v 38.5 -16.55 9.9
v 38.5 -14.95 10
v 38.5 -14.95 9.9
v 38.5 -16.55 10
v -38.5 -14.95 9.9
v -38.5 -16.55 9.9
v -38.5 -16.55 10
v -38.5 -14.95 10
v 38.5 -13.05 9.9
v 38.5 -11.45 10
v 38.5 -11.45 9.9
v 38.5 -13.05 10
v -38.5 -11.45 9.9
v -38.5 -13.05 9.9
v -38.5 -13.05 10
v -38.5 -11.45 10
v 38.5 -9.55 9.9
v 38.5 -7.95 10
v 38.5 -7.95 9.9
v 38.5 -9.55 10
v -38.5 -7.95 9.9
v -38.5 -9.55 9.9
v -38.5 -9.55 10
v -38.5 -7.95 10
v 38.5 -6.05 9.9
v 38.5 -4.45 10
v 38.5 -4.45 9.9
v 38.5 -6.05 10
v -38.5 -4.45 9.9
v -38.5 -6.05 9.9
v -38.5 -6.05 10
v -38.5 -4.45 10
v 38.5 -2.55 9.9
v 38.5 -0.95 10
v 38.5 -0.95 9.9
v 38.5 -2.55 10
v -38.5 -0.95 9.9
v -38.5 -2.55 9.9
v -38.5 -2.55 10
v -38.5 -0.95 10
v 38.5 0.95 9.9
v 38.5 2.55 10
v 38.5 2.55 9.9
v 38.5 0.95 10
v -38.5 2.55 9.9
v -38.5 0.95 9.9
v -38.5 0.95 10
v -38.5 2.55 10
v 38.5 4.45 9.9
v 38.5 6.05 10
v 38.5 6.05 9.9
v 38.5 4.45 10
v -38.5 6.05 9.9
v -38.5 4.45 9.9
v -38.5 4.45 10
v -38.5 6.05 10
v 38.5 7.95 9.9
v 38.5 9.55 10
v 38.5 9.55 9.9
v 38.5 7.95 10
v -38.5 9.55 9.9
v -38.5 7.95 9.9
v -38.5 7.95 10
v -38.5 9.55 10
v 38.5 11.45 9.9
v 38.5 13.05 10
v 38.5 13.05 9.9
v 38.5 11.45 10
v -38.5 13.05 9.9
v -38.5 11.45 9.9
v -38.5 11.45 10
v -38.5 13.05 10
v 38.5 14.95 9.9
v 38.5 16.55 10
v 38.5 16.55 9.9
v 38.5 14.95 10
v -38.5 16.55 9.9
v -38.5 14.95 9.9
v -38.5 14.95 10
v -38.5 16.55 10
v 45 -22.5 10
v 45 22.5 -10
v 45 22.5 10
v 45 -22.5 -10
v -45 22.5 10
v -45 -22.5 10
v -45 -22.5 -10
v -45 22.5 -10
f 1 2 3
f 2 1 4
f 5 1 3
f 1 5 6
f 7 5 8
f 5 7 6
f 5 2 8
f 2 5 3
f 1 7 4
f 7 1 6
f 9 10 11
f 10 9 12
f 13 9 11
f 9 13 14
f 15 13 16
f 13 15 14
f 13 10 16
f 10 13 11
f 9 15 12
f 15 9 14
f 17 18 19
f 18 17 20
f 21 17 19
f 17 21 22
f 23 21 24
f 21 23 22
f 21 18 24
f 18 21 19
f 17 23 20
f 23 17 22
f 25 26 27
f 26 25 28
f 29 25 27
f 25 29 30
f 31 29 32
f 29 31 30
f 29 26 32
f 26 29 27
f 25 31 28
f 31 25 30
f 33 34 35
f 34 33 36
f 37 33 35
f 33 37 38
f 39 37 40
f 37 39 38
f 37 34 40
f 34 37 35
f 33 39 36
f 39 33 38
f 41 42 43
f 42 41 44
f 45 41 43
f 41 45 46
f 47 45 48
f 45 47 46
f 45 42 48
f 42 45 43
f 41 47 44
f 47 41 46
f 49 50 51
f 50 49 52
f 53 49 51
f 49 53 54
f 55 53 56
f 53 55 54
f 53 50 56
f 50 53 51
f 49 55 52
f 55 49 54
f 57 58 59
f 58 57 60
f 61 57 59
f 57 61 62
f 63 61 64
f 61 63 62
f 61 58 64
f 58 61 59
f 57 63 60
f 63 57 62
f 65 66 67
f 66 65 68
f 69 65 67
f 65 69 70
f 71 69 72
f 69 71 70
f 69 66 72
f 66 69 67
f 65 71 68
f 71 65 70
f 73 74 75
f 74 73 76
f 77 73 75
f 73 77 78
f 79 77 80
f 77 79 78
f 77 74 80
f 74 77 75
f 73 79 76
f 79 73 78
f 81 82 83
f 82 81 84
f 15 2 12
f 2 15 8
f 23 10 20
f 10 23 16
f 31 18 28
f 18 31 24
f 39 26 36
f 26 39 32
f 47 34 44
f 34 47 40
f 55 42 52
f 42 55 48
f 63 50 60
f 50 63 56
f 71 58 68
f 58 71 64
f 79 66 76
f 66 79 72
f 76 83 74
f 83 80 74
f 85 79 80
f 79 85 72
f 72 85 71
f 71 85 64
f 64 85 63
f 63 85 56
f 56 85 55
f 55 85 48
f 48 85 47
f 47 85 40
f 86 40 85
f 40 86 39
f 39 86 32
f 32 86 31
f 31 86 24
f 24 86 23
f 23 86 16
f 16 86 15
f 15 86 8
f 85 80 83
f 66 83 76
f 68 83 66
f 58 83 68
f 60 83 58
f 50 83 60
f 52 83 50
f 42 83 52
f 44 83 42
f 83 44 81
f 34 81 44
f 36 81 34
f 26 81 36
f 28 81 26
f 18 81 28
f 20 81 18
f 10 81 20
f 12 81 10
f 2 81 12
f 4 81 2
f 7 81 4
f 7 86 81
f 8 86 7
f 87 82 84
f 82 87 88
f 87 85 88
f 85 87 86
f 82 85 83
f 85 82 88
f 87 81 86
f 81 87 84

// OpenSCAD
// ---------- Parameters ----------
base_len   = 90;    // X dimension of base block (mm)
base_wid   = 45;    // Y dimension of base block (mm)
base_h     = 20;    // Z dimension of base block (mm)

slot_len   = 77;    // Length of each slot along X (mm)
slot_wid   = 1.6;   // Width of each slot along Y (mm)
slot_depth = 10;    // Depth of each slot down from top surface (mm)

slot_count = 10;    // Number of slots
slot_spacing = 3.5; // Centre‑to‑centre spacing between slots (mm)

extra = 0.1;        // Over‑extension for cutting shapes (mm)

$fn = 64;           // Resolution for curved features (not needed here)

// ---------- Model ----------
module drying_rack() {
    difference() {
        // Solid base block, centred on origin
        cube([base_len, base_wid, base_h], center = true);

        // Slots cut from the top face
        union() {
            for (i = [0:slot_count-1]) {
                // Y centre of the i‑th slot
                y_center = -((slot_count - 1) * slot_spacing) / 2 + i * slot_spacing;

                // Cutting cube (extends slightly beyond the intended faces)
                translate([
                    -slot_len/2,                     // centre slot in X
                    y_center - slot_wid/2,           // lower Y bound of slot
                    base_h - slot_depth - extra       // lower Z bound (just below intended depth)
                ])
                    cube([
                        slot_len,
                        slot_wid,
                        slot_depth + 2*extra           // height includes over‑extension
                    ]);
            }
        }
    }
}

// ---------- Render ----------
drying_rack();
